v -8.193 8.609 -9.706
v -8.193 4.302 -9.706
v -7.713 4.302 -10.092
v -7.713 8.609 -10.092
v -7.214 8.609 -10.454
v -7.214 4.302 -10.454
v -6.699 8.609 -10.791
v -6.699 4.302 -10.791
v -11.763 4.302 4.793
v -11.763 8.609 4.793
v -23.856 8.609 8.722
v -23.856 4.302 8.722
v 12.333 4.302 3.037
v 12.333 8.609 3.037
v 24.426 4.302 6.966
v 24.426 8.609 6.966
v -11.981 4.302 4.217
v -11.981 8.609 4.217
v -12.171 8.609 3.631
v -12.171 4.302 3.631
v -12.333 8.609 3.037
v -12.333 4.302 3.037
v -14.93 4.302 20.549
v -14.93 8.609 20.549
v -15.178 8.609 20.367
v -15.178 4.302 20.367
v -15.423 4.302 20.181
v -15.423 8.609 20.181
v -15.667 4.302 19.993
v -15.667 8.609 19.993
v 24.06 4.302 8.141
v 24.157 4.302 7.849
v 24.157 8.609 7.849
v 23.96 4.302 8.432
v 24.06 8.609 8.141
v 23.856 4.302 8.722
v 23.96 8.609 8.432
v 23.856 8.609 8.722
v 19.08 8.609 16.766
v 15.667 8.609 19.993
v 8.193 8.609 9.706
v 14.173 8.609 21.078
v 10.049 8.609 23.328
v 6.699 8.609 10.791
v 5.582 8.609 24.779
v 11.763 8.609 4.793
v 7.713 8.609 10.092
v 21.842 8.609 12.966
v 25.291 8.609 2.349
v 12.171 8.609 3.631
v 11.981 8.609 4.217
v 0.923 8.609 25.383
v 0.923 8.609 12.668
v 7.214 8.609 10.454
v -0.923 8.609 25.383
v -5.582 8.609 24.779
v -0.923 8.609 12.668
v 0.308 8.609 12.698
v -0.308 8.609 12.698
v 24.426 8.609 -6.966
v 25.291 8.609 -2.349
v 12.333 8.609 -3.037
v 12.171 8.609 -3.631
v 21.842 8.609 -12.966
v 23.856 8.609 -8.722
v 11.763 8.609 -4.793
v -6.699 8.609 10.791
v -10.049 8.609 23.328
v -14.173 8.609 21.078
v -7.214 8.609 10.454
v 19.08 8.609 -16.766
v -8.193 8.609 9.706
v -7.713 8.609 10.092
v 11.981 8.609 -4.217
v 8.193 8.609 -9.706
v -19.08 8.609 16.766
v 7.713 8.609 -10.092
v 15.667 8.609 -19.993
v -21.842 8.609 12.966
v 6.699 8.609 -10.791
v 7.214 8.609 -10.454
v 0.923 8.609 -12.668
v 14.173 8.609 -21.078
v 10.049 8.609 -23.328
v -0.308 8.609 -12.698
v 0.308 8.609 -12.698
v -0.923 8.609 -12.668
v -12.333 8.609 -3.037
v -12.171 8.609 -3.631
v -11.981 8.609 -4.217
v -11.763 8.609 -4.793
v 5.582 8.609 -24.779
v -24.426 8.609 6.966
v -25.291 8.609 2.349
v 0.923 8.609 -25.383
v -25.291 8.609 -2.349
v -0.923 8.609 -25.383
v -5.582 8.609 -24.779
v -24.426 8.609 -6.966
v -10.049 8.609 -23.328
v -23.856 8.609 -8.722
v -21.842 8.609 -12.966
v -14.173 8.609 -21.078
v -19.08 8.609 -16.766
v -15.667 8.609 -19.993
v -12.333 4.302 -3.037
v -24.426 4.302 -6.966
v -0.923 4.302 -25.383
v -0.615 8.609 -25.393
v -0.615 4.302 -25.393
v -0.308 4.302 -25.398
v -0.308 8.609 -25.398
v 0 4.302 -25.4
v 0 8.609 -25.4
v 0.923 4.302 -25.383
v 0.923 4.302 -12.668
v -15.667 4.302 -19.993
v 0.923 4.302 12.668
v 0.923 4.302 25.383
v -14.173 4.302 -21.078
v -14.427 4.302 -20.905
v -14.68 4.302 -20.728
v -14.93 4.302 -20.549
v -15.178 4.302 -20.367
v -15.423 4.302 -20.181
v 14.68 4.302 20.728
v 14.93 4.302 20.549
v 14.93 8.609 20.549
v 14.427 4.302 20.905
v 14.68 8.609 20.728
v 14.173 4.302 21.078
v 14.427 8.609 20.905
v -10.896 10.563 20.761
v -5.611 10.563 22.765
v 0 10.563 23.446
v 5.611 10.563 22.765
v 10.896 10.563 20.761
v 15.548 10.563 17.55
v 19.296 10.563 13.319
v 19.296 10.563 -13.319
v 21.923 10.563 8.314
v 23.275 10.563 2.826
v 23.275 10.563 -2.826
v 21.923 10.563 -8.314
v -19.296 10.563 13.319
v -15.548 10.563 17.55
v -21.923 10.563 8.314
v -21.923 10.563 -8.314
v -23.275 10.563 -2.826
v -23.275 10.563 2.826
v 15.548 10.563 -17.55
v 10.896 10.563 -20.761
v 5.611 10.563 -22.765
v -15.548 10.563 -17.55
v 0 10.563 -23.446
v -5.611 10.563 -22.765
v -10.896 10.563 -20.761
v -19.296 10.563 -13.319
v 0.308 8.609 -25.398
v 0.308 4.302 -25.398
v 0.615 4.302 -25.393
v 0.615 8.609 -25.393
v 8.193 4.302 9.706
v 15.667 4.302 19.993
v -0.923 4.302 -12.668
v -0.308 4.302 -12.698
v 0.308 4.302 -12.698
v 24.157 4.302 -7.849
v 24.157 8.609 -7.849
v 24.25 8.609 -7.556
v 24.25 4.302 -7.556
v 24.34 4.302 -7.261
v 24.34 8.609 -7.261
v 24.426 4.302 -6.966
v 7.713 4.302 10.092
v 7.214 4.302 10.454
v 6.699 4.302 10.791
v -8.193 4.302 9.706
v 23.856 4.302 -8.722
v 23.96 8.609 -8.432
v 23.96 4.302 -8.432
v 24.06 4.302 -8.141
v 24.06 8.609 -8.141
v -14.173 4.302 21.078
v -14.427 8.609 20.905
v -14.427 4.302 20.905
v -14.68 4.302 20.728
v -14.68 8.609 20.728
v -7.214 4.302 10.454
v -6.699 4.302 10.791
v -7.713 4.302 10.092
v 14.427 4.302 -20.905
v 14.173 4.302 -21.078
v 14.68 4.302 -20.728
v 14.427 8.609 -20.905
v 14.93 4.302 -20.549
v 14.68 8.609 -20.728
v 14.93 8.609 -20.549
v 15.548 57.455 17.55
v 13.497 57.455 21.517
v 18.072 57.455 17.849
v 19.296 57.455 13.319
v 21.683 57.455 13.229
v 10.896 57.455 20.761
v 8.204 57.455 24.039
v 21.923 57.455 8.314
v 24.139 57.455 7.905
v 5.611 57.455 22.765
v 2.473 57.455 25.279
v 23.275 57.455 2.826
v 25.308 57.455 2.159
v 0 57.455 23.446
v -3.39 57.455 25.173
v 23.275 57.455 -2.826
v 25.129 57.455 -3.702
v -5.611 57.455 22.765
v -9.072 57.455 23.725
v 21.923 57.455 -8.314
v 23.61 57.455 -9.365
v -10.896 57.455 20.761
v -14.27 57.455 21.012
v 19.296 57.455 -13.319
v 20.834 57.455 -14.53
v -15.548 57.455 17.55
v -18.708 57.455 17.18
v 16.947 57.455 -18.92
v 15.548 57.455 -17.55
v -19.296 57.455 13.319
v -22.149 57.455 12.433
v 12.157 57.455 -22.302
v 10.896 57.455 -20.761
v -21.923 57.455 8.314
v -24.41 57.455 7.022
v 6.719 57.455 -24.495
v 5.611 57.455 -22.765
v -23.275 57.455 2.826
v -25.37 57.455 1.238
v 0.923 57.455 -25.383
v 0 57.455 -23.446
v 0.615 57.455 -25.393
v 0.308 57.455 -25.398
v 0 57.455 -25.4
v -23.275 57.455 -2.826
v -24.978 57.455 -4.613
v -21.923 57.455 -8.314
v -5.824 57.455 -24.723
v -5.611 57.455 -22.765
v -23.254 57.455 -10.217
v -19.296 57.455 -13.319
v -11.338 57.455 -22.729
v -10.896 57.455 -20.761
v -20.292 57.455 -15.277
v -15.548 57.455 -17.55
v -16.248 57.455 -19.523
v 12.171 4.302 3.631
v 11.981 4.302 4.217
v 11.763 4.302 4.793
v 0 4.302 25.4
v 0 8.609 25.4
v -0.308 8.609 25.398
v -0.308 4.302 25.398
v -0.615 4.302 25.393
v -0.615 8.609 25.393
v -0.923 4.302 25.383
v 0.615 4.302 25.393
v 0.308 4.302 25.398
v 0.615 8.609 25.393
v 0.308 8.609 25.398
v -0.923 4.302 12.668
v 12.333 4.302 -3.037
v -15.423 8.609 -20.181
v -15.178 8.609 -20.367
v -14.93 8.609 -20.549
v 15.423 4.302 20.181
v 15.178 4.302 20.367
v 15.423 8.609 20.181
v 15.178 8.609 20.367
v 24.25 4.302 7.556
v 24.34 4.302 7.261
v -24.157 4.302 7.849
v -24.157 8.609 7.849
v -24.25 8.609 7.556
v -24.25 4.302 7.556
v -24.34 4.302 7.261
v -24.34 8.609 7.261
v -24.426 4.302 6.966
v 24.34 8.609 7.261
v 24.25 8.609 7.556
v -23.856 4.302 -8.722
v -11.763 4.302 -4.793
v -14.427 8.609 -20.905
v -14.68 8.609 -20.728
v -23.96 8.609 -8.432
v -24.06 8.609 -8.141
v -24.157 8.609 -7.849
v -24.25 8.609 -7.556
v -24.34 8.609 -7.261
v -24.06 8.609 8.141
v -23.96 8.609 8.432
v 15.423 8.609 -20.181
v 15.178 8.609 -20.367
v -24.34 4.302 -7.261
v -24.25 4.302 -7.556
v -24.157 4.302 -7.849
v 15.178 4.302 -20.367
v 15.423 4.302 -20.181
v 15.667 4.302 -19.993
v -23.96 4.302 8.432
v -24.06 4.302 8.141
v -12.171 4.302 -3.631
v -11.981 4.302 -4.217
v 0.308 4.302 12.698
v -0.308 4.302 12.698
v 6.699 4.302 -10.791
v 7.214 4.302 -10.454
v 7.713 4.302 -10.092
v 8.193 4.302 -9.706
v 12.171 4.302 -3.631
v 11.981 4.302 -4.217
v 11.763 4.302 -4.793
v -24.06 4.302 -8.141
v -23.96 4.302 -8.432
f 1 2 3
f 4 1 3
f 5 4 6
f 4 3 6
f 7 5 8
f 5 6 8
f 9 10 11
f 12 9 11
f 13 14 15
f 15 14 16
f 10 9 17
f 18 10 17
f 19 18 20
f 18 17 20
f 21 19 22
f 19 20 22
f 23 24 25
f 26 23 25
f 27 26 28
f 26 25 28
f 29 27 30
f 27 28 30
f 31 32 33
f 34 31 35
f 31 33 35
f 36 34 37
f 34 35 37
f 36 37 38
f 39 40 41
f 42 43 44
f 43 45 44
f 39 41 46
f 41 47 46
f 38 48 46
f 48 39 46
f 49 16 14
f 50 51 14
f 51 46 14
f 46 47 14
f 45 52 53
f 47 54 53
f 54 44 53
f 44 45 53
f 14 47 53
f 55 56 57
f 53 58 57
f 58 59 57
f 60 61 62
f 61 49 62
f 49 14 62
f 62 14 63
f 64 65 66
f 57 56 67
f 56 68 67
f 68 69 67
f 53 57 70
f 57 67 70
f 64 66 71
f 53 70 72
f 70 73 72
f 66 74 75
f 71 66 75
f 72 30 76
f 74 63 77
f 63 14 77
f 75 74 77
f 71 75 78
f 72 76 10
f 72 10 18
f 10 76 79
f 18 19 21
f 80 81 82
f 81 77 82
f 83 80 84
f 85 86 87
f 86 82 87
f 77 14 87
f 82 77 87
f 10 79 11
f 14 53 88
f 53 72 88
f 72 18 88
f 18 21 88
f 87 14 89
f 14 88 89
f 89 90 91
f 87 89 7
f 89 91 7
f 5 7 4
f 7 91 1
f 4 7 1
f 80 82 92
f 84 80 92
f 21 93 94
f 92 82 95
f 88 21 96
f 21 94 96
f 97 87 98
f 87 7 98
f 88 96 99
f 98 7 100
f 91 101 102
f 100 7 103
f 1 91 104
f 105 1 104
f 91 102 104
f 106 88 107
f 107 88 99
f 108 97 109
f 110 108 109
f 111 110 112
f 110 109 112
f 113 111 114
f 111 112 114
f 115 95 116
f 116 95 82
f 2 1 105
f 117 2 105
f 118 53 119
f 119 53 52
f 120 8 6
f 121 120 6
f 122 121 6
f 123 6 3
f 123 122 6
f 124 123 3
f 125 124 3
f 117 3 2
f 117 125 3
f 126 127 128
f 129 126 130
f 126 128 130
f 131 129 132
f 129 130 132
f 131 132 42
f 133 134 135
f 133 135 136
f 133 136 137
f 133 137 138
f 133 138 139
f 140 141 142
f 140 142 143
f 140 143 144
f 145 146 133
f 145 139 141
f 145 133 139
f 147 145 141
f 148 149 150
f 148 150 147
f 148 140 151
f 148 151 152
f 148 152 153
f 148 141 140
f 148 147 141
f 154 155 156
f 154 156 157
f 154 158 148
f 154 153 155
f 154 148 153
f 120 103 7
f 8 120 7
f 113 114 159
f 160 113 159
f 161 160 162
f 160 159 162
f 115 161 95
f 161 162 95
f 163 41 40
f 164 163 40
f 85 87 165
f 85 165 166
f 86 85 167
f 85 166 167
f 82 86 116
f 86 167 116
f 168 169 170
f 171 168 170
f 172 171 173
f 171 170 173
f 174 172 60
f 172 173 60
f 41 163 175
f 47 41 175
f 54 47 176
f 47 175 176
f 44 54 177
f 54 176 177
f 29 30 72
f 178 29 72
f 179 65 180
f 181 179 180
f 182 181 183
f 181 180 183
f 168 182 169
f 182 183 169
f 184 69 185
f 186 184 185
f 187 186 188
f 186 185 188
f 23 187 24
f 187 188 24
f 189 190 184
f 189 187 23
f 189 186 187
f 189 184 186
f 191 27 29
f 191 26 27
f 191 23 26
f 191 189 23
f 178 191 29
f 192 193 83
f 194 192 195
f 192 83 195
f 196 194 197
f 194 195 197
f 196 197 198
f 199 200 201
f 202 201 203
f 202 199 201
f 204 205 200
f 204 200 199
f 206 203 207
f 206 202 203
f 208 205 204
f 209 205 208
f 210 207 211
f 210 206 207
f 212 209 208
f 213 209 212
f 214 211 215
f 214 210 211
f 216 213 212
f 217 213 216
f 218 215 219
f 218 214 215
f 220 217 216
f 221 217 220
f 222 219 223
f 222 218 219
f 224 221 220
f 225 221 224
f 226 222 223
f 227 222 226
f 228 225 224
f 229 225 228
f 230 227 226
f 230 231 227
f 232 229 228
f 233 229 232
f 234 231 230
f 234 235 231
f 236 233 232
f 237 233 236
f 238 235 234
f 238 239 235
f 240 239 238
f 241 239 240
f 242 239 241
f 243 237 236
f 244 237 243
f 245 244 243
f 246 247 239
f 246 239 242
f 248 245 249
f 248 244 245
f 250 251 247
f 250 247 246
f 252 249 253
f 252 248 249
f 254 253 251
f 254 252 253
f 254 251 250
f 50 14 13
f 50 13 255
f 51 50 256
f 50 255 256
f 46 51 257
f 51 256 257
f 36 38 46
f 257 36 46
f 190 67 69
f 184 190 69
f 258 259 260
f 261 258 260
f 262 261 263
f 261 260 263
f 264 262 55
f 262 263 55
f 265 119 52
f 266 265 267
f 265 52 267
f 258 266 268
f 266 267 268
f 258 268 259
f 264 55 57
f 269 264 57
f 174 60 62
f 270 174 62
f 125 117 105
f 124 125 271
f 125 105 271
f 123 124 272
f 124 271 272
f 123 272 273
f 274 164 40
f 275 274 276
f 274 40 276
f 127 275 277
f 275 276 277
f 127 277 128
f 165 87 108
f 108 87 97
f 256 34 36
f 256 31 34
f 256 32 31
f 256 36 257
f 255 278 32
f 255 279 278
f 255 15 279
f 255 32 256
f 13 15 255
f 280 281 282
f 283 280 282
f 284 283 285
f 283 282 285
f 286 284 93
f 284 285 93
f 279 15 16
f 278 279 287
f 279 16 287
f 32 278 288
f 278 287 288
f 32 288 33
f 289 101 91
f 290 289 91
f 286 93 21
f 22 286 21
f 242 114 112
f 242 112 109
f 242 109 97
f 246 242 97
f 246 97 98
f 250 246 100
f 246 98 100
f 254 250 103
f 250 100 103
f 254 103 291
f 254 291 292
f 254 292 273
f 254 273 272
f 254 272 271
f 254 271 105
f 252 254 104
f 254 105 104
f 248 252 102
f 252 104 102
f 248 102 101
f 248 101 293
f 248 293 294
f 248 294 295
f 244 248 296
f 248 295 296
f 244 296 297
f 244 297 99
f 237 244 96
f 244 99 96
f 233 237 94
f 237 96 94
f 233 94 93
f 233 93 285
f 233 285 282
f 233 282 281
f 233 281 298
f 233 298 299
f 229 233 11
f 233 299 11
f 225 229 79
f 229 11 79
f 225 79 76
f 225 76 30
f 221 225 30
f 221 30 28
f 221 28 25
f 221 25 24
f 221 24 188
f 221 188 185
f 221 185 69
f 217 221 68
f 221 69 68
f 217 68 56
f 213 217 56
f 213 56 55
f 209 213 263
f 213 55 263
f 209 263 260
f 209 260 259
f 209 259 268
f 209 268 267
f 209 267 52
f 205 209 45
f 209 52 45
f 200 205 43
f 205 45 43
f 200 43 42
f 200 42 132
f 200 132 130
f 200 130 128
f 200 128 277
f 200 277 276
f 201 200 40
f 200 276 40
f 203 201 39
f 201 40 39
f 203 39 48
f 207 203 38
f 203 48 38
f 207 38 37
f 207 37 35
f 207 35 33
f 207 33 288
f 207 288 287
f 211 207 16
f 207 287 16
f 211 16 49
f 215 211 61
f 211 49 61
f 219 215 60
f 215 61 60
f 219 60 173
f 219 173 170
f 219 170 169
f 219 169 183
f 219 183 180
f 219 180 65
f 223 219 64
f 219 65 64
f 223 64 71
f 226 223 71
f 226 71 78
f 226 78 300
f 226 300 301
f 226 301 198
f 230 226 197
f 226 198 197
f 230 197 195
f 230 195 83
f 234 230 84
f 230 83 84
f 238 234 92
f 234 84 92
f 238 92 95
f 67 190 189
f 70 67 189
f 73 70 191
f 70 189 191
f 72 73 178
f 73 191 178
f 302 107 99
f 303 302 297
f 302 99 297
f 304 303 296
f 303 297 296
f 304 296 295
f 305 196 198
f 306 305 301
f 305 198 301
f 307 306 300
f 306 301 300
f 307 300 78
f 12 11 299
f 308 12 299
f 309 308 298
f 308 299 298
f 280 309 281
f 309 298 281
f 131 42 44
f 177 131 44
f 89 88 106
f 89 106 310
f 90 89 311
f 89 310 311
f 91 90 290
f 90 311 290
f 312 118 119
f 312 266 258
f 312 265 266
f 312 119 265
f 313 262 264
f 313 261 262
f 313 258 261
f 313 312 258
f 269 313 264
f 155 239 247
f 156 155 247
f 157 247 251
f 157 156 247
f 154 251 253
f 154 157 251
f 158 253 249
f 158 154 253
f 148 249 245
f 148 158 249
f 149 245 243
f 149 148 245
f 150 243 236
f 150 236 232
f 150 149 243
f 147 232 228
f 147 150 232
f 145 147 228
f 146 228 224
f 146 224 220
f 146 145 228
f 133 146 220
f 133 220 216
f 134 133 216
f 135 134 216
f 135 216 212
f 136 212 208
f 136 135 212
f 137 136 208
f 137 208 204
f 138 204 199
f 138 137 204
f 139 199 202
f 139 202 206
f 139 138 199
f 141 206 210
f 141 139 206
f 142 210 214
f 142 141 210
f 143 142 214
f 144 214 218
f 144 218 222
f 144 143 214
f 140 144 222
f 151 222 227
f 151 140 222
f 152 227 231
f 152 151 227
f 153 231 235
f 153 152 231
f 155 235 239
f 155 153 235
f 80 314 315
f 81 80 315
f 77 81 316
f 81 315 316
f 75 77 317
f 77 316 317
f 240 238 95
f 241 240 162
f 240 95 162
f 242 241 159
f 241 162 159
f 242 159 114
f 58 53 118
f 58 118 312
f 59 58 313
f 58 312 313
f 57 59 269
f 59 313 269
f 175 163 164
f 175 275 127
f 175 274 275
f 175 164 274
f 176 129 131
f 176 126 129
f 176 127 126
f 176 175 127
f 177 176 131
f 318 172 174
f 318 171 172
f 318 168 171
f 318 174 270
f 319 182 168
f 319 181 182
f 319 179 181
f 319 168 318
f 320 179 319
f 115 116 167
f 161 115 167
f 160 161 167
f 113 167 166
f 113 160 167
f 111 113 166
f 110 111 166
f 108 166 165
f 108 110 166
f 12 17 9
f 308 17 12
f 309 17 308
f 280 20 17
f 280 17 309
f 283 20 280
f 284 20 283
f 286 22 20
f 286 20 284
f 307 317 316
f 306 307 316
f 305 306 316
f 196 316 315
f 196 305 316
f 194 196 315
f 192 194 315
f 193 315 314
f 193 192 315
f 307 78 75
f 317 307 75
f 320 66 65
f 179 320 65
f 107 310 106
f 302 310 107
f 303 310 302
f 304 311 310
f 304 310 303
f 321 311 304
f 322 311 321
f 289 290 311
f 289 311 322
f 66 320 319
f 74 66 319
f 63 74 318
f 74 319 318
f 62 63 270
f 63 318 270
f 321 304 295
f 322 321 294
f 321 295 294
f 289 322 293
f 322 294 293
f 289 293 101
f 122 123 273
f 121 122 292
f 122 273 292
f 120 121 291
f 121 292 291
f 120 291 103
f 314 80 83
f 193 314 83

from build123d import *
from build123d.topology import SkipClean

# Parameters (mm, degrees)
SKETCH1_R               = 38.1
BOSS_EXTRUDE1_DEPTH     = 76.2
SHELL2_T                = 3.175
BOSS_EXTRUDE2_DEPTH     = 7
CUT_EXTRUDE1_DEPTH      = 99.527366122
CUT_EXTRUDE1_DEPTH_BACK = 99.527366122
SKETCH3_R               = 61.906276858
SKETCH3_R_2             = 41.275
SKETCH4_R               = 20.64
CUT_EXTRUDE2_DEPTH      = 7
SCALE1_SCALE            = 0.615384615


with BuildPart() as part:
    # Sketch1 → Boss-Extrude1 (new body)
    with BuildSketch(Plane(origin=(0, 0, 0), x_dir=(1, 0, 0), z_dir=(0, 1, 0))):
        with Locations(Location((0, 0, 0), (0, 0, 90))):
            Circle(SKETCH1_R)
    extrude(amount=BOSS_EXTRUDE1_DEPTH)

    # Shell2
    shell2_openings = [part.faces().sort_by_distance(p)[0] for p in [
        (0, 76.2, 0),
    ]]
    offset(amount=SHELL2_T, openings=shell2_openings, kind=Kind.INTERSECTION)

    # Sketch2 → Boss-Extrude2 (add)
    with BuildSketch(Plane(origin=(0, -3.175, 0), x_dir=(-1, 0, 0), z_dir=(0, -1, 0))):
        Polygon((-4.854101966, 0), (-39.718383202, -11.328091668), (-38.791332219, -14.181261217), (-3.927050983, -2.853169549), (-25.47436178, -32.510498564), (-23.047310797, -34.273854321), (-1.5, -4.616525306), (-1.5, -41.275), (1.5, -41.275), (1.5, -4.616525306), (23.047310797, -34.273854321), (25.47436178, -32.510498564), (3.927050983, -2.853169549), (38.791332219, -14.181261217), (39.718383202, -11.328091668), (4.854101966, 0), (39.718383202, 11.328091668), (38.791332219, 14.181261217), (3.927050983, 2.853169549), (25.47436178, 32.510498564), (23.047310797, 34.273854321), (1.5, 4.616525306), (1.5, 41.275), (-1.5, 41.275), (-1.5, 4.616525306), (-23.047310797, 34.273854321), (-25.47436178, 32.510498564), (-3.927050983, 2.853169549), (-38.791332219, 14.181261217), (-39.718383202, 11.328091668), align=None)
    extrude(amount=BOSS_EXTRUDE2_DEPTH)

    # Sketch3 → Cut-Extrude1 (cut, two sides: drawn at the far end of the back side and taken through both)
    with SkipClean():  # the faces are left unmerged after this step: merging them gives an invalid solid
        with BuildSketch(Plane.XZ.offset(3.175).offset(-CUT_EXTRUDE1_DEPTH_BACK)):
            Circle(SKETCH3_R)
            with Locations(Location((0, 0, 0), (0, 0, 272.082679548))):
                Circle(SKETCH3_R_2, mode=Mode.SUBTRACT)
        extrude(amount=CUT_EXTRUDE1_DEPTH + CUT_EXTRUDE1_DEPTH_BACK, mode=Mode.SUBTRACT)

    # Sketch4 → Cut-Extrude2 (cut)
    with SkipClean():  # the faces are left unmerged after this step: merging them gives an invalid solid
        with BuildSketch(Plane.XZ.offset(10.175)):
            Circle(SKETCH4_R)
        extrude(amount=-CUT_EXTRUDE2_DEPTH, mode=Mode.SUBTRACT)


with BuildPart() as part_1:
    # Scale1: scaled about (0, 27.463968189, 0)
    add(part.part.scale(SCALE1_SCALE).moved(Location((0, 10.563064688, 0))))


solid = part_1.part
